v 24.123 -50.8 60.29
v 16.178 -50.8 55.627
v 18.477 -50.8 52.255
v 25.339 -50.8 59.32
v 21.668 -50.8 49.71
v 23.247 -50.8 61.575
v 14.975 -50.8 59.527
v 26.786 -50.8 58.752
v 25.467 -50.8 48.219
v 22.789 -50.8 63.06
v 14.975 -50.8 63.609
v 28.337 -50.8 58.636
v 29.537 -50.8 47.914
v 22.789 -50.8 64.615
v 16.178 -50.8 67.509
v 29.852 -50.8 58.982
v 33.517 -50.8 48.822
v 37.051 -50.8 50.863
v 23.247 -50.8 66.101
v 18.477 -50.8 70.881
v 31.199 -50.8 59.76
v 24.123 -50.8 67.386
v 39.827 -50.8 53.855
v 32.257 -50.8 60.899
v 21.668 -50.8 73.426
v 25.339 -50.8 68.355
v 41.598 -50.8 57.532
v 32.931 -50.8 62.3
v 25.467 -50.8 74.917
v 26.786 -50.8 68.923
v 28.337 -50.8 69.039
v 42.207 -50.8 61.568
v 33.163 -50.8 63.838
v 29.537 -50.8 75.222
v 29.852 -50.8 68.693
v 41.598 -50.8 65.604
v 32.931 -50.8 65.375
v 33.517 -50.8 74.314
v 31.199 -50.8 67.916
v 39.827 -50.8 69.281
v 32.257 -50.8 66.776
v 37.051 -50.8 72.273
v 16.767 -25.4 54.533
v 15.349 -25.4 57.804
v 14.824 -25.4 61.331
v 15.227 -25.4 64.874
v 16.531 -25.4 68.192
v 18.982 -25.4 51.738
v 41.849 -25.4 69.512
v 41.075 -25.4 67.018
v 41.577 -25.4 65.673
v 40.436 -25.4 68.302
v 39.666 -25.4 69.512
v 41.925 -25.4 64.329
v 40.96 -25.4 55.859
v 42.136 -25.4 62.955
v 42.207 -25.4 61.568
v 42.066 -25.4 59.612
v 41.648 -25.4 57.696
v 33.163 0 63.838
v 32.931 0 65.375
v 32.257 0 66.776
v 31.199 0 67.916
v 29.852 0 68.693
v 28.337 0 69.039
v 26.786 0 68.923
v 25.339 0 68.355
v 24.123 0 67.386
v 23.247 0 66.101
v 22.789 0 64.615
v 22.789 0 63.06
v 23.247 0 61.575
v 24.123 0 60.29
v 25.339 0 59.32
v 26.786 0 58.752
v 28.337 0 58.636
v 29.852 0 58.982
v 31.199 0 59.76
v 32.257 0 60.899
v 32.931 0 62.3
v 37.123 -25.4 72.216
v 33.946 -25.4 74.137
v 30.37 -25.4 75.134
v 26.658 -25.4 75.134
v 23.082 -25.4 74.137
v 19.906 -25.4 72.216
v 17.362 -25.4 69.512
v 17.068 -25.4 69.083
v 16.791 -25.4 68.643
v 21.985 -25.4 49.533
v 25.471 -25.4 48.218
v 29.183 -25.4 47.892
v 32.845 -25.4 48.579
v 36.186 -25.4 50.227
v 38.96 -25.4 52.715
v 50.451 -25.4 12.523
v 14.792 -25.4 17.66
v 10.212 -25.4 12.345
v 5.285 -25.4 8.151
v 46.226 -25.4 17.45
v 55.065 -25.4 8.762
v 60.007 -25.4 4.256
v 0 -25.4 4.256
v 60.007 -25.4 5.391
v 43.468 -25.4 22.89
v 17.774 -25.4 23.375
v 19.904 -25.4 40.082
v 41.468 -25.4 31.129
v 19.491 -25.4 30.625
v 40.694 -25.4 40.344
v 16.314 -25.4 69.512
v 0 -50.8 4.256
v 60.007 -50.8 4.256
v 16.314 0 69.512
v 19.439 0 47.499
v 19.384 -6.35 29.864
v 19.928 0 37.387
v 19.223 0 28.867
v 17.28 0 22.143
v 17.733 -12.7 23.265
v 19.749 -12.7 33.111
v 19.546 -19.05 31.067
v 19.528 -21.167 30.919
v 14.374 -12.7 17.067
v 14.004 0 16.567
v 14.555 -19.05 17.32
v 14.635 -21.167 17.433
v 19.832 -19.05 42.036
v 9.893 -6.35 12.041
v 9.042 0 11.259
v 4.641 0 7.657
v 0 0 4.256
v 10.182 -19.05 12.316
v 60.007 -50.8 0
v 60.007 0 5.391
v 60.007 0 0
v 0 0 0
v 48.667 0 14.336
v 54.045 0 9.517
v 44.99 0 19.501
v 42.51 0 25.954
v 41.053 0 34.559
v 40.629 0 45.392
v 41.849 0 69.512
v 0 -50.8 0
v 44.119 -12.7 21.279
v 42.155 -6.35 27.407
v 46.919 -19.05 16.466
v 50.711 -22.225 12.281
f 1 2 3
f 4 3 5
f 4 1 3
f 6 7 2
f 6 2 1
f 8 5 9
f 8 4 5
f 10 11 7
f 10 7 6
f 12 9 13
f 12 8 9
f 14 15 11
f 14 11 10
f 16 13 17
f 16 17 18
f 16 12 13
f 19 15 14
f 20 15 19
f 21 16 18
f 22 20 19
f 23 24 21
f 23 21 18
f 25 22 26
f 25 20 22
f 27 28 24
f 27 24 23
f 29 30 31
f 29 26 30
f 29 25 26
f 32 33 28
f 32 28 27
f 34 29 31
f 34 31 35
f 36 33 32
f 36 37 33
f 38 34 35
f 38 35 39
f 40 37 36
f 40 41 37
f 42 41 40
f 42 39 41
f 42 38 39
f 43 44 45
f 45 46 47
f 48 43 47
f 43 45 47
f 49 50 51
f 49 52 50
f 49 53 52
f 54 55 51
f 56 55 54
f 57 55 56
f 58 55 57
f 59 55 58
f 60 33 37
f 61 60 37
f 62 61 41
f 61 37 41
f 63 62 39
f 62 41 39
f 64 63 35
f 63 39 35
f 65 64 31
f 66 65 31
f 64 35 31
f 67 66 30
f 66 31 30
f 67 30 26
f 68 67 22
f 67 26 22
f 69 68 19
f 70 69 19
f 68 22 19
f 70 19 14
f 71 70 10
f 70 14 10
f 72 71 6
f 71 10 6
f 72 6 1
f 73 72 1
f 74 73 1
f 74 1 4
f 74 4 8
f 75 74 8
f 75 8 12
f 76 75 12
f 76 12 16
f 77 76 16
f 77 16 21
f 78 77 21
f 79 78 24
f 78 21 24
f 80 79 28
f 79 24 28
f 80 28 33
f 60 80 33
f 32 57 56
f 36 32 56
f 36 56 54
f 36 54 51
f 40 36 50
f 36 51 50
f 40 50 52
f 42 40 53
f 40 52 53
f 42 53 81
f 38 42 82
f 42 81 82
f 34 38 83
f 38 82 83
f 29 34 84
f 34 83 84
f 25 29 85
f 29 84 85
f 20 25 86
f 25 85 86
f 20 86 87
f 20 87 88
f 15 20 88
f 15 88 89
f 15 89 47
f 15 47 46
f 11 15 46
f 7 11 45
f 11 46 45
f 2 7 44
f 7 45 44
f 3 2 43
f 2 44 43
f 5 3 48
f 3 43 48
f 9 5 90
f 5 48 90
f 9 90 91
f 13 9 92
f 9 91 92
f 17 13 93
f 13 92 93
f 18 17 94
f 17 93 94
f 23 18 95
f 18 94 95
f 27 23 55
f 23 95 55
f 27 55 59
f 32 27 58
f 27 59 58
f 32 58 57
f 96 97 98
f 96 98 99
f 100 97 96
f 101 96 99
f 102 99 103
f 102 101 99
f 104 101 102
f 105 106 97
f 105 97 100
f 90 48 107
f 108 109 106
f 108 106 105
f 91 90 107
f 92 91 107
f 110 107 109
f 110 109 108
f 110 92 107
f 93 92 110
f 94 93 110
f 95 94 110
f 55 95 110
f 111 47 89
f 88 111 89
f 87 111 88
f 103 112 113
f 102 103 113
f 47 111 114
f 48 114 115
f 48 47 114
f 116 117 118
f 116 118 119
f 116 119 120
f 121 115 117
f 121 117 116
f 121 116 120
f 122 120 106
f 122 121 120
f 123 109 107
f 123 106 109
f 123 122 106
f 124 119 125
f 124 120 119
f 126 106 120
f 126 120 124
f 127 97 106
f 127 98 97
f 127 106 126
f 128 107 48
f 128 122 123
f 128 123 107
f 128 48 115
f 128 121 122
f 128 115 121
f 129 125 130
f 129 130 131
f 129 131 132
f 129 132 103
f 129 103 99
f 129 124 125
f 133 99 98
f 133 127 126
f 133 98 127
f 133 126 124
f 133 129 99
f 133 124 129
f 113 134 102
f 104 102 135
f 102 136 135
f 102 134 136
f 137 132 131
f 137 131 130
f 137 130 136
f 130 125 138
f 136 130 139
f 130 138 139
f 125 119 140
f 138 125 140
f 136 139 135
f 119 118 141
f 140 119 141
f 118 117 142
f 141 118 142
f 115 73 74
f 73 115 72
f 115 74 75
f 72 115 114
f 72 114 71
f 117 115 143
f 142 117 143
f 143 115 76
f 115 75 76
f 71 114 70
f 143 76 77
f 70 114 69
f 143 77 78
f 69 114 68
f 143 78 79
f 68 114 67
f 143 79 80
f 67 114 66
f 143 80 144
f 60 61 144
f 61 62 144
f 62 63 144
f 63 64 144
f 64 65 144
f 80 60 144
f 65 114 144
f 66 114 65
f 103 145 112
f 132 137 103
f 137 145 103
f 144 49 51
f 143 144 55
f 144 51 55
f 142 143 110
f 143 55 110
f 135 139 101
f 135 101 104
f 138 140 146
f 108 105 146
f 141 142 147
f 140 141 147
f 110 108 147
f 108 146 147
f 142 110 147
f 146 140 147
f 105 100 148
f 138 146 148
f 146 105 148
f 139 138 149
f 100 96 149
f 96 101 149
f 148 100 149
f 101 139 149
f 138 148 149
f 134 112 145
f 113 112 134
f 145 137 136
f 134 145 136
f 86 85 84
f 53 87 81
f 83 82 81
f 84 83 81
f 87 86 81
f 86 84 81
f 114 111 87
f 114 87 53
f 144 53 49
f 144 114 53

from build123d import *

# Parameters (mm, degrees)
F0_W     = 60.0074976683
F0_H     = 69.5122331381
F1_DEPTH = 50.8
F3_DEPTH = 50.8
F5_DEPTH = 25.4
F6_R     = 13.6924053839
F7_DEPTH = 25.4
F8_R     = 5.2161873837
F9_DEPTH = 50.8


with BuildPart() as f1:
    # F0 (on Front) → F1 (new body)
    with BuildSketch(Plane.XZ):
        with Locations((30.0037488341, 34.756116569)):
            Rectangle(F0_W, F0_H)
    extrude(amount=F1_DEPTH)

    # F2 (on face) → F3 (cut)
    with BuildSketch(Plane.XZ.offset(50.8)):
        with BuildLine():
            Line((60.0074976683, 69.5122331381), (41.8492034078, 69.5122331381))
            add(Edge.make_bspline(
                [(41.8492034078, 69.5122331381), (40.5229985665, 50.963393388), (38.2921086092, 19.7612600302), (53.7421113163, 9.5369669805), (60.0074976683, 5.3907446563)],
                knots=[0, 0, 0, 0, 0.5944734463, 1, 1, 1, 1], degree=3))
            Line((60.0074976683, 5.3907446563), (60.0074976683, 69.5122331381))
        make_face()
        with BuildLine():
            add(Edge.make_bspline(
                [(16.3140948862, 69.5122331381), (19.1757238105, 52.1069225067), (24.1823454085, 21.6551041788), (7.2530413082, 9.4744311002), (0, 4.255851265)],
                knots=[0, 0, 0, 0, 0.571568845, 1, 1, 1, 1], degree=3))
            Line((16.3140948862, 69.5122331381), (0, 69.5122331381))
            Line((0, 69.5122331381), (0, 4.255851265))
        make_face()
    extrude(amount=-F3_DEPTH, mode=Mode.SUBTRACT)

    # F4 (on face) → F5 (cut)
    with BuildSketch(Plane.XZ.offset(50.8)):
        with BuildLine():
            add(Edge.make_bspline(
                [(16.3140948862, 69.5122331381), (19.1757238105, 52.1069225067), (24.1823454085, 21.6551041788), (7.2530413082, 9.4744311002), (0, 4.255851265)],
                knots=[0, 0, 0, 0, 0.571568845, 1, 1, 1, 1], degree=3))
            Line((0, 4.255851265), (60.0074976683, 4.255851265))
            Line((60.0074976683, 4.255851265), (60.0074976683, 5.3907446563))
            add(Edge.make_bspline(
                [(41.8492034078, 69.5122331381), (40.5229985665, 50.963393388), (38.2921086092, 19.7612600302), (53.7421113163, 9.5369669805), (60.0074976683, 5.3907446563)],
                knots=[0, 0, 0, 0, 0.5944734463, 1, 1, 1, 1], degree=3))
            Line((41.8492034078, 69.5122331381), (16.3140948862, 69.5122331381))
        make_face()
    extrude(amount=-F5_DEPTH, mode=Mode.SUBTRACT)

    # F6 (on face) → F7 (join)
    with BuildSketch(Plane.XZ.offset(25.4)):
        with Locations((28.5142045468, 61.5679770708)):
            Circle(F6_R)
    extrude(amount=F7_DEPTH)

    # F8 (on face) → F9 (cut)
    with BuildSketch(Plane.XZ.offset(50.8)):
        with Locations((27.9467590153, 63.8377666473)):
            Circle(F8_R)
    extrude(amount=-F9_DEPTH, mode=Mode.SUBTRACT)


solid = f1.part
